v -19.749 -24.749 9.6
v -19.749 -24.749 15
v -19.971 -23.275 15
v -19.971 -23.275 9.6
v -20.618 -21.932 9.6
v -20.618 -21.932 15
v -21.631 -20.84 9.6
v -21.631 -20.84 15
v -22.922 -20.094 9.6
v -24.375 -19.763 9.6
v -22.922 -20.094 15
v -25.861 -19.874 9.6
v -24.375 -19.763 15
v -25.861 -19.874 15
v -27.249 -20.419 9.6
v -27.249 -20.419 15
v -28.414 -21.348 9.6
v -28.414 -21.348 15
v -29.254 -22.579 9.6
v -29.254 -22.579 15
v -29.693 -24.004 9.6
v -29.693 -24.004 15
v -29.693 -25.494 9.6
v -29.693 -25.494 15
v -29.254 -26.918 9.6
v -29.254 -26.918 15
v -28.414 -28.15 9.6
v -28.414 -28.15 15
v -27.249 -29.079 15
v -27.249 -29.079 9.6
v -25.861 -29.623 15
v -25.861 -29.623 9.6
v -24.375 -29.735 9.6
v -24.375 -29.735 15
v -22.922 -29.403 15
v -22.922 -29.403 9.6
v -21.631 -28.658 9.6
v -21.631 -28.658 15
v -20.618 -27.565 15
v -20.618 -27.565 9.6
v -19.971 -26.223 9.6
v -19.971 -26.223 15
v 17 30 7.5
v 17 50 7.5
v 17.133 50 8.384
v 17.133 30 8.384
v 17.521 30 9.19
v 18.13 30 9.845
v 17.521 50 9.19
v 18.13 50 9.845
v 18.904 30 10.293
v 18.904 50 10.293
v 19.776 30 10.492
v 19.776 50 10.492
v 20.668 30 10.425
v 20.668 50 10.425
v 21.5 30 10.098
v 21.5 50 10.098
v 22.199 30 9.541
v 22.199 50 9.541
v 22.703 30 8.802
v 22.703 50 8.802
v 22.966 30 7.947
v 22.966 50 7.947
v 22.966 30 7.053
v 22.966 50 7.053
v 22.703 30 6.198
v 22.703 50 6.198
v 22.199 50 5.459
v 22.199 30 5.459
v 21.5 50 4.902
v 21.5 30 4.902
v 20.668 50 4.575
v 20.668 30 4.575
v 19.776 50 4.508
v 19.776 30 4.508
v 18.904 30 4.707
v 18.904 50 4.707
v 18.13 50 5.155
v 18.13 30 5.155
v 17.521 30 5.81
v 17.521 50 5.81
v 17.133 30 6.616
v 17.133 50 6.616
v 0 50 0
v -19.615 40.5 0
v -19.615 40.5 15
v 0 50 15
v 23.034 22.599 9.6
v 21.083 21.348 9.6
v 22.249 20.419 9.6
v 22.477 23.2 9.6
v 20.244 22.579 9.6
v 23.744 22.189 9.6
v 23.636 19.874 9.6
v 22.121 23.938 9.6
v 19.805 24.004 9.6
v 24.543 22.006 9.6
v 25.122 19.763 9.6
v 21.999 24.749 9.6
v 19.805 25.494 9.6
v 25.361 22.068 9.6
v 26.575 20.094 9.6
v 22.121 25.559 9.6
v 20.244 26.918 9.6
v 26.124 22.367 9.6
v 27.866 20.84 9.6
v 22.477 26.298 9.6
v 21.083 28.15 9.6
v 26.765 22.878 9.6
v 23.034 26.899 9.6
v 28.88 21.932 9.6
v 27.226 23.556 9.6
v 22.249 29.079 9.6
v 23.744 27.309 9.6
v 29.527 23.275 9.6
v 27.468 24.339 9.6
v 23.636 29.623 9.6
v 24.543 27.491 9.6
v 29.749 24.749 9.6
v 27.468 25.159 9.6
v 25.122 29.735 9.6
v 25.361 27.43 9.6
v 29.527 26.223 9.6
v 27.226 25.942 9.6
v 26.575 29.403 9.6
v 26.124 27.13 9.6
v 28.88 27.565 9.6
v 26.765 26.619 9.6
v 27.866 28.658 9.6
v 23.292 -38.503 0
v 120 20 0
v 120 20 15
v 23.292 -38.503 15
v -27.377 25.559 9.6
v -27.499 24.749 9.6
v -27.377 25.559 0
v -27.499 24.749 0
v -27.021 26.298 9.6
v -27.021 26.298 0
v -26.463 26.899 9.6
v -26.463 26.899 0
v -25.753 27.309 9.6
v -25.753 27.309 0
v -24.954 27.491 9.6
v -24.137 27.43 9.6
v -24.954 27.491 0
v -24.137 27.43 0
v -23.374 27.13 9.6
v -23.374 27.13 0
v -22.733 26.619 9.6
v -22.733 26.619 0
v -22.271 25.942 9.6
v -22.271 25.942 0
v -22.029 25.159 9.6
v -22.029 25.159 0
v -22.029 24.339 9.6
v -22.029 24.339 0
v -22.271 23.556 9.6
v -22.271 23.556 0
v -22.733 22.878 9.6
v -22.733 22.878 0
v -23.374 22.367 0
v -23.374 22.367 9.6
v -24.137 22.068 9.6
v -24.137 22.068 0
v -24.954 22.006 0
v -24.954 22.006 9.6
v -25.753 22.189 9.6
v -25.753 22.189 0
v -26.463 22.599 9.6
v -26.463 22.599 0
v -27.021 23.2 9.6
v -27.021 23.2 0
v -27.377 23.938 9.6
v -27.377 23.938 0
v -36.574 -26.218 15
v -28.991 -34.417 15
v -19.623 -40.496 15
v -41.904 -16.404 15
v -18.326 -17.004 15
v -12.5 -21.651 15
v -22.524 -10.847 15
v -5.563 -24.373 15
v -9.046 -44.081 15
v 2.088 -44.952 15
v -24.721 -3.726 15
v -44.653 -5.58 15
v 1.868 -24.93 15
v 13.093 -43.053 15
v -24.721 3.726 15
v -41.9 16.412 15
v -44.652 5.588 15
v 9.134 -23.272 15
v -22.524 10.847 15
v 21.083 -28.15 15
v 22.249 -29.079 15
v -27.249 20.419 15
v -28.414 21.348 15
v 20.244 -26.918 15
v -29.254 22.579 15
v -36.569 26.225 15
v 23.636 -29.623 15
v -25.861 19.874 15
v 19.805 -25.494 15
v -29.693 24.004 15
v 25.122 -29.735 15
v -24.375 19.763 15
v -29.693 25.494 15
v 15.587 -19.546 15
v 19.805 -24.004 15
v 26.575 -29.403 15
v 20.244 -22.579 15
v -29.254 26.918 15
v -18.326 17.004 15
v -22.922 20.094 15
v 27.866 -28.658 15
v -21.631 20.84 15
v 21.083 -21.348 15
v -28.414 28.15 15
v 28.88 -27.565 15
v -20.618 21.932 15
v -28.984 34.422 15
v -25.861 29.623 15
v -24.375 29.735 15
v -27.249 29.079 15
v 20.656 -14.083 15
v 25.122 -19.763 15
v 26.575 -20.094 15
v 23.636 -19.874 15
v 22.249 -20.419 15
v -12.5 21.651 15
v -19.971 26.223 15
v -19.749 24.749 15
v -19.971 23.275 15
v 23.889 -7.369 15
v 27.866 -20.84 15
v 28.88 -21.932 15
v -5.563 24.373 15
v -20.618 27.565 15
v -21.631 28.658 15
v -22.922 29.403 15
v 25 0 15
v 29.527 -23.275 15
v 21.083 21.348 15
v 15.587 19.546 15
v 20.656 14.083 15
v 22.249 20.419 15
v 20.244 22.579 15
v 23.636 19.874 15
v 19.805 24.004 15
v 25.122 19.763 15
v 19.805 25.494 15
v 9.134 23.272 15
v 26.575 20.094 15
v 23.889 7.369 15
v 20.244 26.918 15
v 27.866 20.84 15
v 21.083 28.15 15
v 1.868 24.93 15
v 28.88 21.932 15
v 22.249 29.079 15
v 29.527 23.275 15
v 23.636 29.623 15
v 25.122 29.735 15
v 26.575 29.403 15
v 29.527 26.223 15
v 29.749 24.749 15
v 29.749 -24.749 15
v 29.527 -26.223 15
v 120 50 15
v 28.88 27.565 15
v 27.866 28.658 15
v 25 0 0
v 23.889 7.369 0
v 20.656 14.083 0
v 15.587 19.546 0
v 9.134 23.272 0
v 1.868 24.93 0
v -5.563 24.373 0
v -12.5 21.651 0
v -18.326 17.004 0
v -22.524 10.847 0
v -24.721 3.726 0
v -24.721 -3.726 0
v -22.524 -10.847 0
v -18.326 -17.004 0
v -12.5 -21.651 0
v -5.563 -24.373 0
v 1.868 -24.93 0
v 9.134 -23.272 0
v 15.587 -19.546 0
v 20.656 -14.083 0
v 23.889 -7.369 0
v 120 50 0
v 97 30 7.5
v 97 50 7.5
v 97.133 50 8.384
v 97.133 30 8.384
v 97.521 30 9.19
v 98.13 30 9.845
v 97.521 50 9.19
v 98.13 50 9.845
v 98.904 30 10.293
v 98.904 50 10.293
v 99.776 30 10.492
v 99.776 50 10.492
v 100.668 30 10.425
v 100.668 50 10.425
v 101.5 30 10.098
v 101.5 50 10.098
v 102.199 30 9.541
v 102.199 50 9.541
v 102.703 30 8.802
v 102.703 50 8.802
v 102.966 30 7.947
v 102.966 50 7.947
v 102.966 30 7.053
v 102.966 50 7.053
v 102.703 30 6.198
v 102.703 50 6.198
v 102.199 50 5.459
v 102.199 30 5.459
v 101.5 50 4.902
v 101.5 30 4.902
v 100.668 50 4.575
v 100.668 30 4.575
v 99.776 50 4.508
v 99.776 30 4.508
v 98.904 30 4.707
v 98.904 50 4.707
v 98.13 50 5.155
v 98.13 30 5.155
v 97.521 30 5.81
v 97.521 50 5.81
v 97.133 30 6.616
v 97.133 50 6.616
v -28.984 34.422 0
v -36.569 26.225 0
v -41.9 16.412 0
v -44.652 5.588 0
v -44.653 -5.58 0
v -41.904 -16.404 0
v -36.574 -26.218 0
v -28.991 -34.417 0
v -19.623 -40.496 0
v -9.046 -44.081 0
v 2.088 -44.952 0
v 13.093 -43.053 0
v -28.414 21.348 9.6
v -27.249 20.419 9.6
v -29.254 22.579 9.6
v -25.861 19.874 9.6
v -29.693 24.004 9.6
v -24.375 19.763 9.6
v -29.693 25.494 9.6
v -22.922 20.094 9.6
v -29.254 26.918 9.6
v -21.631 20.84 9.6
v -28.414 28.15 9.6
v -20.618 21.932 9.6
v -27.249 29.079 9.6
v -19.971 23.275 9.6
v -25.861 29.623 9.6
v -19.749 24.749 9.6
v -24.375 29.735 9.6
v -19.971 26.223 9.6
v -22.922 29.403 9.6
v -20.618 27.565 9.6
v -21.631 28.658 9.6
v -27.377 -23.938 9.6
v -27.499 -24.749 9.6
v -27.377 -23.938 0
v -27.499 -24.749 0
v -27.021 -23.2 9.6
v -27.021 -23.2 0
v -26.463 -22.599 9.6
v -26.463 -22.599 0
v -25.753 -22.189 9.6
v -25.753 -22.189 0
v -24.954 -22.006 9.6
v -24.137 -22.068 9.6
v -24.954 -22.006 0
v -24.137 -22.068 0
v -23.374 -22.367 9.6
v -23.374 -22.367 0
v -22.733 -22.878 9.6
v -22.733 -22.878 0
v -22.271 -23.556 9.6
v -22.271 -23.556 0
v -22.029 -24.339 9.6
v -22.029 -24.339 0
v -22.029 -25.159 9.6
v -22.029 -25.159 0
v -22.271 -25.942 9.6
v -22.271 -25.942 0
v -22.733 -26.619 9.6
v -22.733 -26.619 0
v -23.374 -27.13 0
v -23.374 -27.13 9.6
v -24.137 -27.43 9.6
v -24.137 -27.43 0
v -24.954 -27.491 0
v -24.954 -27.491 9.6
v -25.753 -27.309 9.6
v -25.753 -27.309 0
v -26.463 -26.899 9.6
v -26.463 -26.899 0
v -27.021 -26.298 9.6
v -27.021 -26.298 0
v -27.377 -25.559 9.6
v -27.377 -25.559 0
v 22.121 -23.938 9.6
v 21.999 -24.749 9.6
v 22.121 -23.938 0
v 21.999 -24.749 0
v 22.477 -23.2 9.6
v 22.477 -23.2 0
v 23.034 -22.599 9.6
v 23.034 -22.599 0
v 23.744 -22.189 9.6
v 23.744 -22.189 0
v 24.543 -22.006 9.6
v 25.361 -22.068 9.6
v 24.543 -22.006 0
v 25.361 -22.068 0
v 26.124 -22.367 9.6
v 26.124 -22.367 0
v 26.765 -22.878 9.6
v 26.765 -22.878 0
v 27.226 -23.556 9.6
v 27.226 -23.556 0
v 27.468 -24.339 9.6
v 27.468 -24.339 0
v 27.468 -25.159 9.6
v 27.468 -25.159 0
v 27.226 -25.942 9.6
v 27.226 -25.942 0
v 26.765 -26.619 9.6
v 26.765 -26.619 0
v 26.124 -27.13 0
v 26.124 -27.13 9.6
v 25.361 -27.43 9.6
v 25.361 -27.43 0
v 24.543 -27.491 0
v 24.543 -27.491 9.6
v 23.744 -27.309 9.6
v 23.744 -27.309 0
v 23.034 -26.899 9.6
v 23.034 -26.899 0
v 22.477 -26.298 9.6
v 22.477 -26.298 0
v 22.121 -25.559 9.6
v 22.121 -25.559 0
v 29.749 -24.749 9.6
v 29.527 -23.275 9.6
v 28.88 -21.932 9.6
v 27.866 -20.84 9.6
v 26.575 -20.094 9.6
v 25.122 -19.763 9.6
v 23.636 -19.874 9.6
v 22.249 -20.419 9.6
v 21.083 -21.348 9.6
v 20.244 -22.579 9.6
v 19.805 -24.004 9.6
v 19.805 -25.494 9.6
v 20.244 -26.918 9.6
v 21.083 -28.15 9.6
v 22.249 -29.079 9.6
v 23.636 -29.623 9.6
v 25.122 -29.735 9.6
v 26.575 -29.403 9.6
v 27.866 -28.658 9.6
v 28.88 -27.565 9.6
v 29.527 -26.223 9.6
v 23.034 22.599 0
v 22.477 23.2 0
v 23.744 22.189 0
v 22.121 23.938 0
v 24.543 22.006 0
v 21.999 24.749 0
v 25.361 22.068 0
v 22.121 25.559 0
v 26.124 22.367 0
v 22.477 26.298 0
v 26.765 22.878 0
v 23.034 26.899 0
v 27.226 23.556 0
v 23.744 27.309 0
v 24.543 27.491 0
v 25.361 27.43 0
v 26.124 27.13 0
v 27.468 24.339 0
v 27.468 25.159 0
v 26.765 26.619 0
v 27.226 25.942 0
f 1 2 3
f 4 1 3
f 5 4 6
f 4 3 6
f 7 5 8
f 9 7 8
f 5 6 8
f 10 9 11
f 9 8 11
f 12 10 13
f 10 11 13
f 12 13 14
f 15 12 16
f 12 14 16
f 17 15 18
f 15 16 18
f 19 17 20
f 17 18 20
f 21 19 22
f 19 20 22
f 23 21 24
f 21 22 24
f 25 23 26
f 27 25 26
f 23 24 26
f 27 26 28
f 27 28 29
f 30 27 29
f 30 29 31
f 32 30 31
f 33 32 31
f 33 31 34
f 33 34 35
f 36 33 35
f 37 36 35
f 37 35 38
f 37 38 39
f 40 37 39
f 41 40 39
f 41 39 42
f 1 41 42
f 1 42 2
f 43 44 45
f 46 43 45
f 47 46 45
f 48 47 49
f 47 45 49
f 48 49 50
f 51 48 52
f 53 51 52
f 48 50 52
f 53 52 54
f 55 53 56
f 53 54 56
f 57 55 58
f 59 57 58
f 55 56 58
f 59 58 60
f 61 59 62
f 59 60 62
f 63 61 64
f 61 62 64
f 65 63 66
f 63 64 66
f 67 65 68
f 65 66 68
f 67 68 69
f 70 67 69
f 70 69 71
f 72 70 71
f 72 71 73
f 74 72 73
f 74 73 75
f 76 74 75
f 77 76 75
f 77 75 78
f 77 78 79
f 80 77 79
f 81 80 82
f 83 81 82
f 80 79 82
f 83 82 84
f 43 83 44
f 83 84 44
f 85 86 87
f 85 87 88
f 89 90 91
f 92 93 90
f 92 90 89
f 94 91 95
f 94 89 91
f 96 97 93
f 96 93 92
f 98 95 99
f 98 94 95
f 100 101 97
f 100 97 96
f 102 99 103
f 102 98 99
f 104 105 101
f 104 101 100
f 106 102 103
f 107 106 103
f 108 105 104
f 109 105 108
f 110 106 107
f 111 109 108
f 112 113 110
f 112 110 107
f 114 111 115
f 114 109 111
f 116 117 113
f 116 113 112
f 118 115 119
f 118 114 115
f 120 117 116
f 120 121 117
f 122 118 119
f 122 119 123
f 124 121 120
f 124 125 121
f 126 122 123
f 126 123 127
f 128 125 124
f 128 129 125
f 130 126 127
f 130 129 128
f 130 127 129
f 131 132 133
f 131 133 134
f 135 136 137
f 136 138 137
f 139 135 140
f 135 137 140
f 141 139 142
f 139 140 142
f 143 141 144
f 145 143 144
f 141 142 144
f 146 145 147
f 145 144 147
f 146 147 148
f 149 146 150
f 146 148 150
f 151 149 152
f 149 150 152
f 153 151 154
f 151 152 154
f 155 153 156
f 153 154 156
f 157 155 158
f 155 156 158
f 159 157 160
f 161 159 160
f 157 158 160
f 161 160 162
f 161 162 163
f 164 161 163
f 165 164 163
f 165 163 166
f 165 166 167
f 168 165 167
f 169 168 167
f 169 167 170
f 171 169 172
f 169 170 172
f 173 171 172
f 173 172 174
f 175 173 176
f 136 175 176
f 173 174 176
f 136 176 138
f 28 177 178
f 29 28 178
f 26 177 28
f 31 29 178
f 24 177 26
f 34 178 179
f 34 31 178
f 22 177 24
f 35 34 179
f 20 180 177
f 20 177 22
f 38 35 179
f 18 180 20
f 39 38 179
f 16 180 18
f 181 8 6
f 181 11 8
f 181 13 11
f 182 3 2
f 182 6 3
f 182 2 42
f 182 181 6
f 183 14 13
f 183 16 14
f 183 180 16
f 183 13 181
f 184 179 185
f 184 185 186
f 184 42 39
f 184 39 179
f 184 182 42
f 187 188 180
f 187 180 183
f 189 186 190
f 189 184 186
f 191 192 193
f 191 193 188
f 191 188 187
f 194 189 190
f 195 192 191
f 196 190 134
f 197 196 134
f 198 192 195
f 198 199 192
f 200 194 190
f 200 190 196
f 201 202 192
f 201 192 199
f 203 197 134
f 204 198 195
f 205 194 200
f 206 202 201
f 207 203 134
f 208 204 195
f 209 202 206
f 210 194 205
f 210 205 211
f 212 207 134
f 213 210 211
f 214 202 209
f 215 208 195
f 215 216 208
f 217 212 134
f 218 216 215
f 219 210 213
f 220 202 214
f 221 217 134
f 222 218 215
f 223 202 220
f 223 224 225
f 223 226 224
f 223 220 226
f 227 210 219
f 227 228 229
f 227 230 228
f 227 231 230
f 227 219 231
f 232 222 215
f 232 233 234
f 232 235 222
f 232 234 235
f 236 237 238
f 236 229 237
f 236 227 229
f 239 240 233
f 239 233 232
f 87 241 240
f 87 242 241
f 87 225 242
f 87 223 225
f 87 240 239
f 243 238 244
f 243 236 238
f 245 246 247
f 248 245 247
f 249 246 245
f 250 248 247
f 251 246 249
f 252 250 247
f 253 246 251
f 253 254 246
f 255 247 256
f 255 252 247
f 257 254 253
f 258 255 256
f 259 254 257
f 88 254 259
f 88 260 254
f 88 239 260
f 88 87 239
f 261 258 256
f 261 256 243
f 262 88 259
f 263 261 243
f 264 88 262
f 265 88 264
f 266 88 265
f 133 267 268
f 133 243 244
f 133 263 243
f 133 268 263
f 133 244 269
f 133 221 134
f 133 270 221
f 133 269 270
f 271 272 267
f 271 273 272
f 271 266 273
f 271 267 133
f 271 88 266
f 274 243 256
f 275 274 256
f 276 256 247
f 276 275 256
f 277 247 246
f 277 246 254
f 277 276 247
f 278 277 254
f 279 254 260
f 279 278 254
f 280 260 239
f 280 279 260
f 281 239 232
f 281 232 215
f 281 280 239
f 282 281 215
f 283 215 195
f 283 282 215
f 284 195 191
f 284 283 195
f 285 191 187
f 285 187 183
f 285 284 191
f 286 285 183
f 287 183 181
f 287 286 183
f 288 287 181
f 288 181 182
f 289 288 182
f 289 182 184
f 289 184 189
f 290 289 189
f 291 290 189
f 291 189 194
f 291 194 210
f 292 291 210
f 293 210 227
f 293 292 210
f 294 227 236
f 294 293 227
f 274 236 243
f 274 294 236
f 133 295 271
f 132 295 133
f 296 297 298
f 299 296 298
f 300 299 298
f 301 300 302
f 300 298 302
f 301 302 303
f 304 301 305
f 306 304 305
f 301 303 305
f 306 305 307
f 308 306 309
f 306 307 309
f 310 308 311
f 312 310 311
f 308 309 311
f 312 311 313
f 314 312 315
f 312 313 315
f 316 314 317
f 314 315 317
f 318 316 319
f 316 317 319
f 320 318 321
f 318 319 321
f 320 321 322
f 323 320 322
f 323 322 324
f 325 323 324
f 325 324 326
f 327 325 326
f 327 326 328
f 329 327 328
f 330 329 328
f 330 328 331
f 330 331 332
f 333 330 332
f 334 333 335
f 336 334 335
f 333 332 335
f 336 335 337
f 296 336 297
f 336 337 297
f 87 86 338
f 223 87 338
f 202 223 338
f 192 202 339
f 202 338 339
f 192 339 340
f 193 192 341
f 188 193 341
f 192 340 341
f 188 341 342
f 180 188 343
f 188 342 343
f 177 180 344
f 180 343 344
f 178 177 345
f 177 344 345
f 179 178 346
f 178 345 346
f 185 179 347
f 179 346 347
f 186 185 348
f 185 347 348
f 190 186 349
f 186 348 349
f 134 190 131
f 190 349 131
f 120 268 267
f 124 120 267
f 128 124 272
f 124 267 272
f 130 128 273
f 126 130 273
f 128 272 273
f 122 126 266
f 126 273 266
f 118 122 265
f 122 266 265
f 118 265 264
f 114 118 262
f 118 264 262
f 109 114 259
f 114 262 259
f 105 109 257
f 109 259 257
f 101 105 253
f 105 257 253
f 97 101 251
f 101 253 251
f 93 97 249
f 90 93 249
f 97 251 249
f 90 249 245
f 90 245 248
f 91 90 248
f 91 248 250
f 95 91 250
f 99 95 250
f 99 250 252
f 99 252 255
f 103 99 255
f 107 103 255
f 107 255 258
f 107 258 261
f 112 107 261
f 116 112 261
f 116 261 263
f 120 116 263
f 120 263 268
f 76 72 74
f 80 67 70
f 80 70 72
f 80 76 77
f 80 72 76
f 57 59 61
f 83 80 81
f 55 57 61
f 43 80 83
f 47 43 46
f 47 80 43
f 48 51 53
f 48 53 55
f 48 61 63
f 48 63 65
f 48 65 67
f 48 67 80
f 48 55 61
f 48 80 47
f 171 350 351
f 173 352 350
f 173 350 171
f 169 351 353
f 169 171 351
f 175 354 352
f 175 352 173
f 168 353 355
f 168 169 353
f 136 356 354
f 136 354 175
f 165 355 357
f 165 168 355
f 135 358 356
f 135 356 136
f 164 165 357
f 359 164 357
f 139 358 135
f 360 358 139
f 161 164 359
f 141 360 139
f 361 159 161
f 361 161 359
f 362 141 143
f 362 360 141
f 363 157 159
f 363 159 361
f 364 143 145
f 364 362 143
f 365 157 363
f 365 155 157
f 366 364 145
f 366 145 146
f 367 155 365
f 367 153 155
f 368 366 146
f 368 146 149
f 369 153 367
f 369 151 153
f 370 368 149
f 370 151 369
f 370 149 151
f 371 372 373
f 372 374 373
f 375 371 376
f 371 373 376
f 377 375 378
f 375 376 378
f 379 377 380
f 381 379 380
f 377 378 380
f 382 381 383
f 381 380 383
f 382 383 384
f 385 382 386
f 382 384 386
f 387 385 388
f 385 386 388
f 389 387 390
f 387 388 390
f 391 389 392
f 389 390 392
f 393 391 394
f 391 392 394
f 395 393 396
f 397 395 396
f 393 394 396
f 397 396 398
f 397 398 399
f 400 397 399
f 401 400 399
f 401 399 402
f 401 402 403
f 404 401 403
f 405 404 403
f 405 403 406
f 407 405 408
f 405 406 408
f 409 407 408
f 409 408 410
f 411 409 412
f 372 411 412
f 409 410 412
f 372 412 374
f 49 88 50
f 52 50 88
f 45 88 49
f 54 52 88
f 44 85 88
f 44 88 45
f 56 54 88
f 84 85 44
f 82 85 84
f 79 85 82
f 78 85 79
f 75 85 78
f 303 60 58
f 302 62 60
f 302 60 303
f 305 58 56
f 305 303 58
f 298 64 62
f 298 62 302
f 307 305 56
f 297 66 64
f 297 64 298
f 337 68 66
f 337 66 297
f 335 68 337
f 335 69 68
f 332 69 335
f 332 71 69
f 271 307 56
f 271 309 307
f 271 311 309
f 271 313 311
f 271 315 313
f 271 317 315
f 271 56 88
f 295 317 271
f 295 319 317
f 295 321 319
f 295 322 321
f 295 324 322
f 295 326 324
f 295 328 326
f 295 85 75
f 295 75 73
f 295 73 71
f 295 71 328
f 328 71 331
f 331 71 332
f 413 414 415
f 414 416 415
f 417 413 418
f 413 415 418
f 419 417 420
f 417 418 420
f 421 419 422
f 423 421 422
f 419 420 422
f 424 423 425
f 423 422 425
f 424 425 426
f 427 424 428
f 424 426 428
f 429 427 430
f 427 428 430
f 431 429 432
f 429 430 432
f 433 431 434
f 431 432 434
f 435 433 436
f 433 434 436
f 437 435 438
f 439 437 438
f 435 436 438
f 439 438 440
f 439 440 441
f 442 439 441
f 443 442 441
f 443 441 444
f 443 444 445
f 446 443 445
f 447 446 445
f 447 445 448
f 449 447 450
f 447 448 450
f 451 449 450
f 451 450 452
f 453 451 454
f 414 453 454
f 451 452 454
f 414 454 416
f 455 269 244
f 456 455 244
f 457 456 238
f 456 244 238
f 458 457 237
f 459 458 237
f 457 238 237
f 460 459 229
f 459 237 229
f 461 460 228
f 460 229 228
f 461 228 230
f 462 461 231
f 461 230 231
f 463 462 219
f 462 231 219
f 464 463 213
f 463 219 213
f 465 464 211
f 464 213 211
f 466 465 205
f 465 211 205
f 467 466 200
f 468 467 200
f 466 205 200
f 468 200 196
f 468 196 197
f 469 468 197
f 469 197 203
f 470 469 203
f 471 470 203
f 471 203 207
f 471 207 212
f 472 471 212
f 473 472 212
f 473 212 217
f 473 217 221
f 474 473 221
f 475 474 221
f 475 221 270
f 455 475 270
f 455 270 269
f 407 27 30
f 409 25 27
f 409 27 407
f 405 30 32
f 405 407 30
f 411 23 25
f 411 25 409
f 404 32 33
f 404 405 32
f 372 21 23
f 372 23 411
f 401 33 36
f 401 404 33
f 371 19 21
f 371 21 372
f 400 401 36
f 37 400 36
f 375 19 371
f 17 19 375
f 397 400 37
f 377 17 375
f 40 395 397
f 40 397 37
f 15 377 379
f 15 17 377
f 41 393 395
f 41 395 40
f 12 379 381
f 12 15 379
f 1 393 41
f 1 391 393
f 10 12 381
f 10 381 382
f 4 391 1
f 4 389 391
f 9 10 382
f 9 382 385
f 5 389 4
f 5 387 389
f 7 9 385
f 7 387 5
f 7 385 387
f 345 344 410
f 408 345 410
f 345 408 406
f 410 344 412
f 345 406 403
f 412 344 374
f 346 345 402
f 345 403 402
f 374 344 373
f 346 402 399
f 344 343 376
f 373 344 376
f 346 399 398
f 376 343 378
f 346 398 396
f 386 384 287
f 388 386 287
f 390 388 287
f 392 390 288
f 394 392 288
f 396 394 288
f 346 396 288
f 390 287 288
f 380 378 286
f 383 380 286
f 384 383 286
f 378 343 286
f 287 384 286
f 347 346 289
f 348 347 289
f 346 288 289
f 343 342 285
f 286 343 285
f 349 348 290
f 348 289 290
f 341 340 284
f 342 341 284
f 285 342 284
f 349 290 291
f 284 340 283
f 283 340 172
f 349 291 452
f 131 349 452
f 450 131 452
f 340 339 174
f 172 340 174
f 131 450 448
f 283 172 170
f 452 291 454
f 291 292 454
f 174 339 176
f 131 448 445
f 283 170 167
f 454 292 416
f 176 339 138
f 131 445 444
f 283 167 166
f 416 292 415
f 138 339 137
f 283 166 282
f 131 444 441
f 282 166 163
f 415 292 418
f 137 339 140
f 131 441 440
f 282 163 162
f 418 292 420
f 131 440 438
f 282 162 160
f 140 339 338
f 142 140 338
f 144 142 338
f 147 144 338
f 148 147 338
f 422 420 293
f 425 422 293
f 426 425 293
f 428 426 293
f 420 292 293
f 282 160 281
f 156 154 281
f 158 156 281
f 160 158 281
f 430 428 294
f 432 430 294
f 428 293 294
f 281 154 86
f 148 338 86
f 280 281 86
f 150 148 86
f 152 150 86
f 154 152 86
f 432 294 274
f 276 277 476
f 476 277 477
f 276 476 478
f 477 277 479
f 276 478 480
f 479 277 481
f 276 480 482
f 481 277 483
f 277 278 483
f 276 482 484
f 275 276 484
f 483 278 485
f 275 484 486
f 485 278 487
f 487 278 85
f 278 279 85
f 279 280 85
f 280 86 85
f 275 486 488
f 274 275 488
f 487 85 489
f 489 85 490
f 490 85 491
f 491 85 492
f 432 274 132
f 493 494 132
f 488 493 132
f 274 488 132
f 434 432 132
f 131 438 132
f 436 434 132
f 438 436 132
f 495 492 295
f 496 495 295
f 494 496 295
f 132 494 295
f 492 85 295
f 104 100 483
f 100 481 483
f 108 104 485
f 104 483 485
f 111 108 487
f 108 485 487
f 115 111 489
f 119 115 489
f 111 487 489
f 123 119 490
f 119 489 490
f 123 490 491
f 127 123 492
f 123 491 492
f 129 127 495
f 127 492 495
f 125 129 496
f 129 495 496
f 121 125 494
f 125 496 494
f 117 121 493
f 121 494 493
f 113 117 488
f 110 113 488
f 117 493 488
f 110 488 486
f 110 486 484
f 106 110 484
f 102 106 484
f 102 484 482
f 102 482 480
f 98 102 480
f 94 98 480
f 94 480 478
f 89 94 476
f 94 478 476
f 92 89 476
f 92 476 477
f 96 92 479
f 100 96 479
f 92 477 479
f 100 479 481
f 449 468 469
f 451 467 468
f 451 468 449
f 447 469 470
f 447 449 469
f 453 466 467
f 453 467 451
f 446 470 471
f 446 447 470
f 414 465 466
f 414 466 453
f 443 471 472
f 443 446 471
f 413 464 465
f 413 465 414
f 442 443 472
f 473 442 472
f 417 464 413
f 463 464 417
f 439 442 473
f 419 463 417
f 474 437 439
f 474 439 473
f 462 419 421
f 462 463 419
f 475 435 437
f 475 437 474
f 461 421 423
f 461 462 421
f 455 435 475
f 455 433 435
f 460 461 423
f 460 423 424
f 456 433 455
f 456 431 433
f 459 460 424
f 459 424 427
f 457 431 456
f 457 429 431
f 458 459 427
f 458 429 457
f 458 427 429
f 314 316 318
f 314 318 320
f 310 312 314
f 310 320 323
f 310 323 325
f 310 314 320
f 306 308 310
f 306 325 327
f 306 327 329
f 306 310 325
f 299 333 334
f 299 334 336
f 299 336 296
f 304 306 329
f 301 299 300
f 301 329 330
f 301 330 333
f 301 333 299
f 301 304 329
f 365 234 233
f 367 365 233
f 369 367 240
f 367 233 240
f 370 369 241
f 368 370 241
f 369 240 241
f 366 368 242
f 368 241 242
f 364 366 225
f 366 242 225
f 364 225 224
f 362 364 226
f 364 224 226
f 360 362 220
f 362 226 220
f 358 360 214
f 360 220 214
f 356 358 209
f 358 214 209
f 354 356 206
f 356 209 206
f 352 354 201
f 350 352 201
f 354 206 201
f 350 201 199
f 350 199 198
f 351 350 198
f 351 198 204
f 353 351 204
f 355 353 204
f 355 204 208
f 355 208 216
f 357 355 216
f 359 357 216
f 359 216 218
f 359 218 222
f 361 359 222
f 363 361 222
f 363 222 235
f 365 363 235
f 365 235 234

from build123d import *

# Parameters (mm, degrees)
SKETCH_R         = 25
PAD_DEPTH        = 15
HOLE_D           = 5.5
HOLE_DEPTH       = 25
HOLE_CBORE_D     = 10
HOLE_CBORE_DEPTH = 5.4
SKETCH002_R      = 3
POCKET_DEPTH     = 20


with BuildPart() as part:
    # Sketch → Pad (new body)
    with BuildSketch(Plane.XY):
        with BuildLine():
            ThreePointArc((-19.615045, 40.5), (-39.544228, -21.476825), (23.292155, -38.502929))
            Line((120, 20), (23.292155, -38.502929))
            Line((120, 50), (120, 20))
            Line((0, 50), (120, 50))
            Line((-19.615045, 40.5), (0, 50))
        make_face()
        Circle(SKETCH_R, mode=Mode.SUBTRACT)
    extrude(amount=PAD_DEPTH)

    # Hole
    with Locations(Plane.XY.offset(15)):
        with Locations((24.748737, 24.748737), (24.748737, -24.748737), (-24.748737, -24.748737), (-24.748737, 24.748737)):
            CounterBoreHole(HOLE_D / 2, HOLE_CBORE_D / 2, HOLE_CBORE_DEPTH, depth=HOLE_DEPTH)

    # Sketch002 (on Face6 of Hole) → Pocket (cut)
    with BuildSketch(Plane(origin=(0, 50, 0), x_dir=(-1, 0, 0), z_dir=(0, 1, 0))):
        with Locations((-100, 7.5)):
            Circle(SKETCH002_R)
        with Locations((-20, 7.5)):
            Circle(SKETCH002_R)
    extrude(amount=-POCKET_DEPTH, mode=Mode.SUBTRACT)


solid = part.part
